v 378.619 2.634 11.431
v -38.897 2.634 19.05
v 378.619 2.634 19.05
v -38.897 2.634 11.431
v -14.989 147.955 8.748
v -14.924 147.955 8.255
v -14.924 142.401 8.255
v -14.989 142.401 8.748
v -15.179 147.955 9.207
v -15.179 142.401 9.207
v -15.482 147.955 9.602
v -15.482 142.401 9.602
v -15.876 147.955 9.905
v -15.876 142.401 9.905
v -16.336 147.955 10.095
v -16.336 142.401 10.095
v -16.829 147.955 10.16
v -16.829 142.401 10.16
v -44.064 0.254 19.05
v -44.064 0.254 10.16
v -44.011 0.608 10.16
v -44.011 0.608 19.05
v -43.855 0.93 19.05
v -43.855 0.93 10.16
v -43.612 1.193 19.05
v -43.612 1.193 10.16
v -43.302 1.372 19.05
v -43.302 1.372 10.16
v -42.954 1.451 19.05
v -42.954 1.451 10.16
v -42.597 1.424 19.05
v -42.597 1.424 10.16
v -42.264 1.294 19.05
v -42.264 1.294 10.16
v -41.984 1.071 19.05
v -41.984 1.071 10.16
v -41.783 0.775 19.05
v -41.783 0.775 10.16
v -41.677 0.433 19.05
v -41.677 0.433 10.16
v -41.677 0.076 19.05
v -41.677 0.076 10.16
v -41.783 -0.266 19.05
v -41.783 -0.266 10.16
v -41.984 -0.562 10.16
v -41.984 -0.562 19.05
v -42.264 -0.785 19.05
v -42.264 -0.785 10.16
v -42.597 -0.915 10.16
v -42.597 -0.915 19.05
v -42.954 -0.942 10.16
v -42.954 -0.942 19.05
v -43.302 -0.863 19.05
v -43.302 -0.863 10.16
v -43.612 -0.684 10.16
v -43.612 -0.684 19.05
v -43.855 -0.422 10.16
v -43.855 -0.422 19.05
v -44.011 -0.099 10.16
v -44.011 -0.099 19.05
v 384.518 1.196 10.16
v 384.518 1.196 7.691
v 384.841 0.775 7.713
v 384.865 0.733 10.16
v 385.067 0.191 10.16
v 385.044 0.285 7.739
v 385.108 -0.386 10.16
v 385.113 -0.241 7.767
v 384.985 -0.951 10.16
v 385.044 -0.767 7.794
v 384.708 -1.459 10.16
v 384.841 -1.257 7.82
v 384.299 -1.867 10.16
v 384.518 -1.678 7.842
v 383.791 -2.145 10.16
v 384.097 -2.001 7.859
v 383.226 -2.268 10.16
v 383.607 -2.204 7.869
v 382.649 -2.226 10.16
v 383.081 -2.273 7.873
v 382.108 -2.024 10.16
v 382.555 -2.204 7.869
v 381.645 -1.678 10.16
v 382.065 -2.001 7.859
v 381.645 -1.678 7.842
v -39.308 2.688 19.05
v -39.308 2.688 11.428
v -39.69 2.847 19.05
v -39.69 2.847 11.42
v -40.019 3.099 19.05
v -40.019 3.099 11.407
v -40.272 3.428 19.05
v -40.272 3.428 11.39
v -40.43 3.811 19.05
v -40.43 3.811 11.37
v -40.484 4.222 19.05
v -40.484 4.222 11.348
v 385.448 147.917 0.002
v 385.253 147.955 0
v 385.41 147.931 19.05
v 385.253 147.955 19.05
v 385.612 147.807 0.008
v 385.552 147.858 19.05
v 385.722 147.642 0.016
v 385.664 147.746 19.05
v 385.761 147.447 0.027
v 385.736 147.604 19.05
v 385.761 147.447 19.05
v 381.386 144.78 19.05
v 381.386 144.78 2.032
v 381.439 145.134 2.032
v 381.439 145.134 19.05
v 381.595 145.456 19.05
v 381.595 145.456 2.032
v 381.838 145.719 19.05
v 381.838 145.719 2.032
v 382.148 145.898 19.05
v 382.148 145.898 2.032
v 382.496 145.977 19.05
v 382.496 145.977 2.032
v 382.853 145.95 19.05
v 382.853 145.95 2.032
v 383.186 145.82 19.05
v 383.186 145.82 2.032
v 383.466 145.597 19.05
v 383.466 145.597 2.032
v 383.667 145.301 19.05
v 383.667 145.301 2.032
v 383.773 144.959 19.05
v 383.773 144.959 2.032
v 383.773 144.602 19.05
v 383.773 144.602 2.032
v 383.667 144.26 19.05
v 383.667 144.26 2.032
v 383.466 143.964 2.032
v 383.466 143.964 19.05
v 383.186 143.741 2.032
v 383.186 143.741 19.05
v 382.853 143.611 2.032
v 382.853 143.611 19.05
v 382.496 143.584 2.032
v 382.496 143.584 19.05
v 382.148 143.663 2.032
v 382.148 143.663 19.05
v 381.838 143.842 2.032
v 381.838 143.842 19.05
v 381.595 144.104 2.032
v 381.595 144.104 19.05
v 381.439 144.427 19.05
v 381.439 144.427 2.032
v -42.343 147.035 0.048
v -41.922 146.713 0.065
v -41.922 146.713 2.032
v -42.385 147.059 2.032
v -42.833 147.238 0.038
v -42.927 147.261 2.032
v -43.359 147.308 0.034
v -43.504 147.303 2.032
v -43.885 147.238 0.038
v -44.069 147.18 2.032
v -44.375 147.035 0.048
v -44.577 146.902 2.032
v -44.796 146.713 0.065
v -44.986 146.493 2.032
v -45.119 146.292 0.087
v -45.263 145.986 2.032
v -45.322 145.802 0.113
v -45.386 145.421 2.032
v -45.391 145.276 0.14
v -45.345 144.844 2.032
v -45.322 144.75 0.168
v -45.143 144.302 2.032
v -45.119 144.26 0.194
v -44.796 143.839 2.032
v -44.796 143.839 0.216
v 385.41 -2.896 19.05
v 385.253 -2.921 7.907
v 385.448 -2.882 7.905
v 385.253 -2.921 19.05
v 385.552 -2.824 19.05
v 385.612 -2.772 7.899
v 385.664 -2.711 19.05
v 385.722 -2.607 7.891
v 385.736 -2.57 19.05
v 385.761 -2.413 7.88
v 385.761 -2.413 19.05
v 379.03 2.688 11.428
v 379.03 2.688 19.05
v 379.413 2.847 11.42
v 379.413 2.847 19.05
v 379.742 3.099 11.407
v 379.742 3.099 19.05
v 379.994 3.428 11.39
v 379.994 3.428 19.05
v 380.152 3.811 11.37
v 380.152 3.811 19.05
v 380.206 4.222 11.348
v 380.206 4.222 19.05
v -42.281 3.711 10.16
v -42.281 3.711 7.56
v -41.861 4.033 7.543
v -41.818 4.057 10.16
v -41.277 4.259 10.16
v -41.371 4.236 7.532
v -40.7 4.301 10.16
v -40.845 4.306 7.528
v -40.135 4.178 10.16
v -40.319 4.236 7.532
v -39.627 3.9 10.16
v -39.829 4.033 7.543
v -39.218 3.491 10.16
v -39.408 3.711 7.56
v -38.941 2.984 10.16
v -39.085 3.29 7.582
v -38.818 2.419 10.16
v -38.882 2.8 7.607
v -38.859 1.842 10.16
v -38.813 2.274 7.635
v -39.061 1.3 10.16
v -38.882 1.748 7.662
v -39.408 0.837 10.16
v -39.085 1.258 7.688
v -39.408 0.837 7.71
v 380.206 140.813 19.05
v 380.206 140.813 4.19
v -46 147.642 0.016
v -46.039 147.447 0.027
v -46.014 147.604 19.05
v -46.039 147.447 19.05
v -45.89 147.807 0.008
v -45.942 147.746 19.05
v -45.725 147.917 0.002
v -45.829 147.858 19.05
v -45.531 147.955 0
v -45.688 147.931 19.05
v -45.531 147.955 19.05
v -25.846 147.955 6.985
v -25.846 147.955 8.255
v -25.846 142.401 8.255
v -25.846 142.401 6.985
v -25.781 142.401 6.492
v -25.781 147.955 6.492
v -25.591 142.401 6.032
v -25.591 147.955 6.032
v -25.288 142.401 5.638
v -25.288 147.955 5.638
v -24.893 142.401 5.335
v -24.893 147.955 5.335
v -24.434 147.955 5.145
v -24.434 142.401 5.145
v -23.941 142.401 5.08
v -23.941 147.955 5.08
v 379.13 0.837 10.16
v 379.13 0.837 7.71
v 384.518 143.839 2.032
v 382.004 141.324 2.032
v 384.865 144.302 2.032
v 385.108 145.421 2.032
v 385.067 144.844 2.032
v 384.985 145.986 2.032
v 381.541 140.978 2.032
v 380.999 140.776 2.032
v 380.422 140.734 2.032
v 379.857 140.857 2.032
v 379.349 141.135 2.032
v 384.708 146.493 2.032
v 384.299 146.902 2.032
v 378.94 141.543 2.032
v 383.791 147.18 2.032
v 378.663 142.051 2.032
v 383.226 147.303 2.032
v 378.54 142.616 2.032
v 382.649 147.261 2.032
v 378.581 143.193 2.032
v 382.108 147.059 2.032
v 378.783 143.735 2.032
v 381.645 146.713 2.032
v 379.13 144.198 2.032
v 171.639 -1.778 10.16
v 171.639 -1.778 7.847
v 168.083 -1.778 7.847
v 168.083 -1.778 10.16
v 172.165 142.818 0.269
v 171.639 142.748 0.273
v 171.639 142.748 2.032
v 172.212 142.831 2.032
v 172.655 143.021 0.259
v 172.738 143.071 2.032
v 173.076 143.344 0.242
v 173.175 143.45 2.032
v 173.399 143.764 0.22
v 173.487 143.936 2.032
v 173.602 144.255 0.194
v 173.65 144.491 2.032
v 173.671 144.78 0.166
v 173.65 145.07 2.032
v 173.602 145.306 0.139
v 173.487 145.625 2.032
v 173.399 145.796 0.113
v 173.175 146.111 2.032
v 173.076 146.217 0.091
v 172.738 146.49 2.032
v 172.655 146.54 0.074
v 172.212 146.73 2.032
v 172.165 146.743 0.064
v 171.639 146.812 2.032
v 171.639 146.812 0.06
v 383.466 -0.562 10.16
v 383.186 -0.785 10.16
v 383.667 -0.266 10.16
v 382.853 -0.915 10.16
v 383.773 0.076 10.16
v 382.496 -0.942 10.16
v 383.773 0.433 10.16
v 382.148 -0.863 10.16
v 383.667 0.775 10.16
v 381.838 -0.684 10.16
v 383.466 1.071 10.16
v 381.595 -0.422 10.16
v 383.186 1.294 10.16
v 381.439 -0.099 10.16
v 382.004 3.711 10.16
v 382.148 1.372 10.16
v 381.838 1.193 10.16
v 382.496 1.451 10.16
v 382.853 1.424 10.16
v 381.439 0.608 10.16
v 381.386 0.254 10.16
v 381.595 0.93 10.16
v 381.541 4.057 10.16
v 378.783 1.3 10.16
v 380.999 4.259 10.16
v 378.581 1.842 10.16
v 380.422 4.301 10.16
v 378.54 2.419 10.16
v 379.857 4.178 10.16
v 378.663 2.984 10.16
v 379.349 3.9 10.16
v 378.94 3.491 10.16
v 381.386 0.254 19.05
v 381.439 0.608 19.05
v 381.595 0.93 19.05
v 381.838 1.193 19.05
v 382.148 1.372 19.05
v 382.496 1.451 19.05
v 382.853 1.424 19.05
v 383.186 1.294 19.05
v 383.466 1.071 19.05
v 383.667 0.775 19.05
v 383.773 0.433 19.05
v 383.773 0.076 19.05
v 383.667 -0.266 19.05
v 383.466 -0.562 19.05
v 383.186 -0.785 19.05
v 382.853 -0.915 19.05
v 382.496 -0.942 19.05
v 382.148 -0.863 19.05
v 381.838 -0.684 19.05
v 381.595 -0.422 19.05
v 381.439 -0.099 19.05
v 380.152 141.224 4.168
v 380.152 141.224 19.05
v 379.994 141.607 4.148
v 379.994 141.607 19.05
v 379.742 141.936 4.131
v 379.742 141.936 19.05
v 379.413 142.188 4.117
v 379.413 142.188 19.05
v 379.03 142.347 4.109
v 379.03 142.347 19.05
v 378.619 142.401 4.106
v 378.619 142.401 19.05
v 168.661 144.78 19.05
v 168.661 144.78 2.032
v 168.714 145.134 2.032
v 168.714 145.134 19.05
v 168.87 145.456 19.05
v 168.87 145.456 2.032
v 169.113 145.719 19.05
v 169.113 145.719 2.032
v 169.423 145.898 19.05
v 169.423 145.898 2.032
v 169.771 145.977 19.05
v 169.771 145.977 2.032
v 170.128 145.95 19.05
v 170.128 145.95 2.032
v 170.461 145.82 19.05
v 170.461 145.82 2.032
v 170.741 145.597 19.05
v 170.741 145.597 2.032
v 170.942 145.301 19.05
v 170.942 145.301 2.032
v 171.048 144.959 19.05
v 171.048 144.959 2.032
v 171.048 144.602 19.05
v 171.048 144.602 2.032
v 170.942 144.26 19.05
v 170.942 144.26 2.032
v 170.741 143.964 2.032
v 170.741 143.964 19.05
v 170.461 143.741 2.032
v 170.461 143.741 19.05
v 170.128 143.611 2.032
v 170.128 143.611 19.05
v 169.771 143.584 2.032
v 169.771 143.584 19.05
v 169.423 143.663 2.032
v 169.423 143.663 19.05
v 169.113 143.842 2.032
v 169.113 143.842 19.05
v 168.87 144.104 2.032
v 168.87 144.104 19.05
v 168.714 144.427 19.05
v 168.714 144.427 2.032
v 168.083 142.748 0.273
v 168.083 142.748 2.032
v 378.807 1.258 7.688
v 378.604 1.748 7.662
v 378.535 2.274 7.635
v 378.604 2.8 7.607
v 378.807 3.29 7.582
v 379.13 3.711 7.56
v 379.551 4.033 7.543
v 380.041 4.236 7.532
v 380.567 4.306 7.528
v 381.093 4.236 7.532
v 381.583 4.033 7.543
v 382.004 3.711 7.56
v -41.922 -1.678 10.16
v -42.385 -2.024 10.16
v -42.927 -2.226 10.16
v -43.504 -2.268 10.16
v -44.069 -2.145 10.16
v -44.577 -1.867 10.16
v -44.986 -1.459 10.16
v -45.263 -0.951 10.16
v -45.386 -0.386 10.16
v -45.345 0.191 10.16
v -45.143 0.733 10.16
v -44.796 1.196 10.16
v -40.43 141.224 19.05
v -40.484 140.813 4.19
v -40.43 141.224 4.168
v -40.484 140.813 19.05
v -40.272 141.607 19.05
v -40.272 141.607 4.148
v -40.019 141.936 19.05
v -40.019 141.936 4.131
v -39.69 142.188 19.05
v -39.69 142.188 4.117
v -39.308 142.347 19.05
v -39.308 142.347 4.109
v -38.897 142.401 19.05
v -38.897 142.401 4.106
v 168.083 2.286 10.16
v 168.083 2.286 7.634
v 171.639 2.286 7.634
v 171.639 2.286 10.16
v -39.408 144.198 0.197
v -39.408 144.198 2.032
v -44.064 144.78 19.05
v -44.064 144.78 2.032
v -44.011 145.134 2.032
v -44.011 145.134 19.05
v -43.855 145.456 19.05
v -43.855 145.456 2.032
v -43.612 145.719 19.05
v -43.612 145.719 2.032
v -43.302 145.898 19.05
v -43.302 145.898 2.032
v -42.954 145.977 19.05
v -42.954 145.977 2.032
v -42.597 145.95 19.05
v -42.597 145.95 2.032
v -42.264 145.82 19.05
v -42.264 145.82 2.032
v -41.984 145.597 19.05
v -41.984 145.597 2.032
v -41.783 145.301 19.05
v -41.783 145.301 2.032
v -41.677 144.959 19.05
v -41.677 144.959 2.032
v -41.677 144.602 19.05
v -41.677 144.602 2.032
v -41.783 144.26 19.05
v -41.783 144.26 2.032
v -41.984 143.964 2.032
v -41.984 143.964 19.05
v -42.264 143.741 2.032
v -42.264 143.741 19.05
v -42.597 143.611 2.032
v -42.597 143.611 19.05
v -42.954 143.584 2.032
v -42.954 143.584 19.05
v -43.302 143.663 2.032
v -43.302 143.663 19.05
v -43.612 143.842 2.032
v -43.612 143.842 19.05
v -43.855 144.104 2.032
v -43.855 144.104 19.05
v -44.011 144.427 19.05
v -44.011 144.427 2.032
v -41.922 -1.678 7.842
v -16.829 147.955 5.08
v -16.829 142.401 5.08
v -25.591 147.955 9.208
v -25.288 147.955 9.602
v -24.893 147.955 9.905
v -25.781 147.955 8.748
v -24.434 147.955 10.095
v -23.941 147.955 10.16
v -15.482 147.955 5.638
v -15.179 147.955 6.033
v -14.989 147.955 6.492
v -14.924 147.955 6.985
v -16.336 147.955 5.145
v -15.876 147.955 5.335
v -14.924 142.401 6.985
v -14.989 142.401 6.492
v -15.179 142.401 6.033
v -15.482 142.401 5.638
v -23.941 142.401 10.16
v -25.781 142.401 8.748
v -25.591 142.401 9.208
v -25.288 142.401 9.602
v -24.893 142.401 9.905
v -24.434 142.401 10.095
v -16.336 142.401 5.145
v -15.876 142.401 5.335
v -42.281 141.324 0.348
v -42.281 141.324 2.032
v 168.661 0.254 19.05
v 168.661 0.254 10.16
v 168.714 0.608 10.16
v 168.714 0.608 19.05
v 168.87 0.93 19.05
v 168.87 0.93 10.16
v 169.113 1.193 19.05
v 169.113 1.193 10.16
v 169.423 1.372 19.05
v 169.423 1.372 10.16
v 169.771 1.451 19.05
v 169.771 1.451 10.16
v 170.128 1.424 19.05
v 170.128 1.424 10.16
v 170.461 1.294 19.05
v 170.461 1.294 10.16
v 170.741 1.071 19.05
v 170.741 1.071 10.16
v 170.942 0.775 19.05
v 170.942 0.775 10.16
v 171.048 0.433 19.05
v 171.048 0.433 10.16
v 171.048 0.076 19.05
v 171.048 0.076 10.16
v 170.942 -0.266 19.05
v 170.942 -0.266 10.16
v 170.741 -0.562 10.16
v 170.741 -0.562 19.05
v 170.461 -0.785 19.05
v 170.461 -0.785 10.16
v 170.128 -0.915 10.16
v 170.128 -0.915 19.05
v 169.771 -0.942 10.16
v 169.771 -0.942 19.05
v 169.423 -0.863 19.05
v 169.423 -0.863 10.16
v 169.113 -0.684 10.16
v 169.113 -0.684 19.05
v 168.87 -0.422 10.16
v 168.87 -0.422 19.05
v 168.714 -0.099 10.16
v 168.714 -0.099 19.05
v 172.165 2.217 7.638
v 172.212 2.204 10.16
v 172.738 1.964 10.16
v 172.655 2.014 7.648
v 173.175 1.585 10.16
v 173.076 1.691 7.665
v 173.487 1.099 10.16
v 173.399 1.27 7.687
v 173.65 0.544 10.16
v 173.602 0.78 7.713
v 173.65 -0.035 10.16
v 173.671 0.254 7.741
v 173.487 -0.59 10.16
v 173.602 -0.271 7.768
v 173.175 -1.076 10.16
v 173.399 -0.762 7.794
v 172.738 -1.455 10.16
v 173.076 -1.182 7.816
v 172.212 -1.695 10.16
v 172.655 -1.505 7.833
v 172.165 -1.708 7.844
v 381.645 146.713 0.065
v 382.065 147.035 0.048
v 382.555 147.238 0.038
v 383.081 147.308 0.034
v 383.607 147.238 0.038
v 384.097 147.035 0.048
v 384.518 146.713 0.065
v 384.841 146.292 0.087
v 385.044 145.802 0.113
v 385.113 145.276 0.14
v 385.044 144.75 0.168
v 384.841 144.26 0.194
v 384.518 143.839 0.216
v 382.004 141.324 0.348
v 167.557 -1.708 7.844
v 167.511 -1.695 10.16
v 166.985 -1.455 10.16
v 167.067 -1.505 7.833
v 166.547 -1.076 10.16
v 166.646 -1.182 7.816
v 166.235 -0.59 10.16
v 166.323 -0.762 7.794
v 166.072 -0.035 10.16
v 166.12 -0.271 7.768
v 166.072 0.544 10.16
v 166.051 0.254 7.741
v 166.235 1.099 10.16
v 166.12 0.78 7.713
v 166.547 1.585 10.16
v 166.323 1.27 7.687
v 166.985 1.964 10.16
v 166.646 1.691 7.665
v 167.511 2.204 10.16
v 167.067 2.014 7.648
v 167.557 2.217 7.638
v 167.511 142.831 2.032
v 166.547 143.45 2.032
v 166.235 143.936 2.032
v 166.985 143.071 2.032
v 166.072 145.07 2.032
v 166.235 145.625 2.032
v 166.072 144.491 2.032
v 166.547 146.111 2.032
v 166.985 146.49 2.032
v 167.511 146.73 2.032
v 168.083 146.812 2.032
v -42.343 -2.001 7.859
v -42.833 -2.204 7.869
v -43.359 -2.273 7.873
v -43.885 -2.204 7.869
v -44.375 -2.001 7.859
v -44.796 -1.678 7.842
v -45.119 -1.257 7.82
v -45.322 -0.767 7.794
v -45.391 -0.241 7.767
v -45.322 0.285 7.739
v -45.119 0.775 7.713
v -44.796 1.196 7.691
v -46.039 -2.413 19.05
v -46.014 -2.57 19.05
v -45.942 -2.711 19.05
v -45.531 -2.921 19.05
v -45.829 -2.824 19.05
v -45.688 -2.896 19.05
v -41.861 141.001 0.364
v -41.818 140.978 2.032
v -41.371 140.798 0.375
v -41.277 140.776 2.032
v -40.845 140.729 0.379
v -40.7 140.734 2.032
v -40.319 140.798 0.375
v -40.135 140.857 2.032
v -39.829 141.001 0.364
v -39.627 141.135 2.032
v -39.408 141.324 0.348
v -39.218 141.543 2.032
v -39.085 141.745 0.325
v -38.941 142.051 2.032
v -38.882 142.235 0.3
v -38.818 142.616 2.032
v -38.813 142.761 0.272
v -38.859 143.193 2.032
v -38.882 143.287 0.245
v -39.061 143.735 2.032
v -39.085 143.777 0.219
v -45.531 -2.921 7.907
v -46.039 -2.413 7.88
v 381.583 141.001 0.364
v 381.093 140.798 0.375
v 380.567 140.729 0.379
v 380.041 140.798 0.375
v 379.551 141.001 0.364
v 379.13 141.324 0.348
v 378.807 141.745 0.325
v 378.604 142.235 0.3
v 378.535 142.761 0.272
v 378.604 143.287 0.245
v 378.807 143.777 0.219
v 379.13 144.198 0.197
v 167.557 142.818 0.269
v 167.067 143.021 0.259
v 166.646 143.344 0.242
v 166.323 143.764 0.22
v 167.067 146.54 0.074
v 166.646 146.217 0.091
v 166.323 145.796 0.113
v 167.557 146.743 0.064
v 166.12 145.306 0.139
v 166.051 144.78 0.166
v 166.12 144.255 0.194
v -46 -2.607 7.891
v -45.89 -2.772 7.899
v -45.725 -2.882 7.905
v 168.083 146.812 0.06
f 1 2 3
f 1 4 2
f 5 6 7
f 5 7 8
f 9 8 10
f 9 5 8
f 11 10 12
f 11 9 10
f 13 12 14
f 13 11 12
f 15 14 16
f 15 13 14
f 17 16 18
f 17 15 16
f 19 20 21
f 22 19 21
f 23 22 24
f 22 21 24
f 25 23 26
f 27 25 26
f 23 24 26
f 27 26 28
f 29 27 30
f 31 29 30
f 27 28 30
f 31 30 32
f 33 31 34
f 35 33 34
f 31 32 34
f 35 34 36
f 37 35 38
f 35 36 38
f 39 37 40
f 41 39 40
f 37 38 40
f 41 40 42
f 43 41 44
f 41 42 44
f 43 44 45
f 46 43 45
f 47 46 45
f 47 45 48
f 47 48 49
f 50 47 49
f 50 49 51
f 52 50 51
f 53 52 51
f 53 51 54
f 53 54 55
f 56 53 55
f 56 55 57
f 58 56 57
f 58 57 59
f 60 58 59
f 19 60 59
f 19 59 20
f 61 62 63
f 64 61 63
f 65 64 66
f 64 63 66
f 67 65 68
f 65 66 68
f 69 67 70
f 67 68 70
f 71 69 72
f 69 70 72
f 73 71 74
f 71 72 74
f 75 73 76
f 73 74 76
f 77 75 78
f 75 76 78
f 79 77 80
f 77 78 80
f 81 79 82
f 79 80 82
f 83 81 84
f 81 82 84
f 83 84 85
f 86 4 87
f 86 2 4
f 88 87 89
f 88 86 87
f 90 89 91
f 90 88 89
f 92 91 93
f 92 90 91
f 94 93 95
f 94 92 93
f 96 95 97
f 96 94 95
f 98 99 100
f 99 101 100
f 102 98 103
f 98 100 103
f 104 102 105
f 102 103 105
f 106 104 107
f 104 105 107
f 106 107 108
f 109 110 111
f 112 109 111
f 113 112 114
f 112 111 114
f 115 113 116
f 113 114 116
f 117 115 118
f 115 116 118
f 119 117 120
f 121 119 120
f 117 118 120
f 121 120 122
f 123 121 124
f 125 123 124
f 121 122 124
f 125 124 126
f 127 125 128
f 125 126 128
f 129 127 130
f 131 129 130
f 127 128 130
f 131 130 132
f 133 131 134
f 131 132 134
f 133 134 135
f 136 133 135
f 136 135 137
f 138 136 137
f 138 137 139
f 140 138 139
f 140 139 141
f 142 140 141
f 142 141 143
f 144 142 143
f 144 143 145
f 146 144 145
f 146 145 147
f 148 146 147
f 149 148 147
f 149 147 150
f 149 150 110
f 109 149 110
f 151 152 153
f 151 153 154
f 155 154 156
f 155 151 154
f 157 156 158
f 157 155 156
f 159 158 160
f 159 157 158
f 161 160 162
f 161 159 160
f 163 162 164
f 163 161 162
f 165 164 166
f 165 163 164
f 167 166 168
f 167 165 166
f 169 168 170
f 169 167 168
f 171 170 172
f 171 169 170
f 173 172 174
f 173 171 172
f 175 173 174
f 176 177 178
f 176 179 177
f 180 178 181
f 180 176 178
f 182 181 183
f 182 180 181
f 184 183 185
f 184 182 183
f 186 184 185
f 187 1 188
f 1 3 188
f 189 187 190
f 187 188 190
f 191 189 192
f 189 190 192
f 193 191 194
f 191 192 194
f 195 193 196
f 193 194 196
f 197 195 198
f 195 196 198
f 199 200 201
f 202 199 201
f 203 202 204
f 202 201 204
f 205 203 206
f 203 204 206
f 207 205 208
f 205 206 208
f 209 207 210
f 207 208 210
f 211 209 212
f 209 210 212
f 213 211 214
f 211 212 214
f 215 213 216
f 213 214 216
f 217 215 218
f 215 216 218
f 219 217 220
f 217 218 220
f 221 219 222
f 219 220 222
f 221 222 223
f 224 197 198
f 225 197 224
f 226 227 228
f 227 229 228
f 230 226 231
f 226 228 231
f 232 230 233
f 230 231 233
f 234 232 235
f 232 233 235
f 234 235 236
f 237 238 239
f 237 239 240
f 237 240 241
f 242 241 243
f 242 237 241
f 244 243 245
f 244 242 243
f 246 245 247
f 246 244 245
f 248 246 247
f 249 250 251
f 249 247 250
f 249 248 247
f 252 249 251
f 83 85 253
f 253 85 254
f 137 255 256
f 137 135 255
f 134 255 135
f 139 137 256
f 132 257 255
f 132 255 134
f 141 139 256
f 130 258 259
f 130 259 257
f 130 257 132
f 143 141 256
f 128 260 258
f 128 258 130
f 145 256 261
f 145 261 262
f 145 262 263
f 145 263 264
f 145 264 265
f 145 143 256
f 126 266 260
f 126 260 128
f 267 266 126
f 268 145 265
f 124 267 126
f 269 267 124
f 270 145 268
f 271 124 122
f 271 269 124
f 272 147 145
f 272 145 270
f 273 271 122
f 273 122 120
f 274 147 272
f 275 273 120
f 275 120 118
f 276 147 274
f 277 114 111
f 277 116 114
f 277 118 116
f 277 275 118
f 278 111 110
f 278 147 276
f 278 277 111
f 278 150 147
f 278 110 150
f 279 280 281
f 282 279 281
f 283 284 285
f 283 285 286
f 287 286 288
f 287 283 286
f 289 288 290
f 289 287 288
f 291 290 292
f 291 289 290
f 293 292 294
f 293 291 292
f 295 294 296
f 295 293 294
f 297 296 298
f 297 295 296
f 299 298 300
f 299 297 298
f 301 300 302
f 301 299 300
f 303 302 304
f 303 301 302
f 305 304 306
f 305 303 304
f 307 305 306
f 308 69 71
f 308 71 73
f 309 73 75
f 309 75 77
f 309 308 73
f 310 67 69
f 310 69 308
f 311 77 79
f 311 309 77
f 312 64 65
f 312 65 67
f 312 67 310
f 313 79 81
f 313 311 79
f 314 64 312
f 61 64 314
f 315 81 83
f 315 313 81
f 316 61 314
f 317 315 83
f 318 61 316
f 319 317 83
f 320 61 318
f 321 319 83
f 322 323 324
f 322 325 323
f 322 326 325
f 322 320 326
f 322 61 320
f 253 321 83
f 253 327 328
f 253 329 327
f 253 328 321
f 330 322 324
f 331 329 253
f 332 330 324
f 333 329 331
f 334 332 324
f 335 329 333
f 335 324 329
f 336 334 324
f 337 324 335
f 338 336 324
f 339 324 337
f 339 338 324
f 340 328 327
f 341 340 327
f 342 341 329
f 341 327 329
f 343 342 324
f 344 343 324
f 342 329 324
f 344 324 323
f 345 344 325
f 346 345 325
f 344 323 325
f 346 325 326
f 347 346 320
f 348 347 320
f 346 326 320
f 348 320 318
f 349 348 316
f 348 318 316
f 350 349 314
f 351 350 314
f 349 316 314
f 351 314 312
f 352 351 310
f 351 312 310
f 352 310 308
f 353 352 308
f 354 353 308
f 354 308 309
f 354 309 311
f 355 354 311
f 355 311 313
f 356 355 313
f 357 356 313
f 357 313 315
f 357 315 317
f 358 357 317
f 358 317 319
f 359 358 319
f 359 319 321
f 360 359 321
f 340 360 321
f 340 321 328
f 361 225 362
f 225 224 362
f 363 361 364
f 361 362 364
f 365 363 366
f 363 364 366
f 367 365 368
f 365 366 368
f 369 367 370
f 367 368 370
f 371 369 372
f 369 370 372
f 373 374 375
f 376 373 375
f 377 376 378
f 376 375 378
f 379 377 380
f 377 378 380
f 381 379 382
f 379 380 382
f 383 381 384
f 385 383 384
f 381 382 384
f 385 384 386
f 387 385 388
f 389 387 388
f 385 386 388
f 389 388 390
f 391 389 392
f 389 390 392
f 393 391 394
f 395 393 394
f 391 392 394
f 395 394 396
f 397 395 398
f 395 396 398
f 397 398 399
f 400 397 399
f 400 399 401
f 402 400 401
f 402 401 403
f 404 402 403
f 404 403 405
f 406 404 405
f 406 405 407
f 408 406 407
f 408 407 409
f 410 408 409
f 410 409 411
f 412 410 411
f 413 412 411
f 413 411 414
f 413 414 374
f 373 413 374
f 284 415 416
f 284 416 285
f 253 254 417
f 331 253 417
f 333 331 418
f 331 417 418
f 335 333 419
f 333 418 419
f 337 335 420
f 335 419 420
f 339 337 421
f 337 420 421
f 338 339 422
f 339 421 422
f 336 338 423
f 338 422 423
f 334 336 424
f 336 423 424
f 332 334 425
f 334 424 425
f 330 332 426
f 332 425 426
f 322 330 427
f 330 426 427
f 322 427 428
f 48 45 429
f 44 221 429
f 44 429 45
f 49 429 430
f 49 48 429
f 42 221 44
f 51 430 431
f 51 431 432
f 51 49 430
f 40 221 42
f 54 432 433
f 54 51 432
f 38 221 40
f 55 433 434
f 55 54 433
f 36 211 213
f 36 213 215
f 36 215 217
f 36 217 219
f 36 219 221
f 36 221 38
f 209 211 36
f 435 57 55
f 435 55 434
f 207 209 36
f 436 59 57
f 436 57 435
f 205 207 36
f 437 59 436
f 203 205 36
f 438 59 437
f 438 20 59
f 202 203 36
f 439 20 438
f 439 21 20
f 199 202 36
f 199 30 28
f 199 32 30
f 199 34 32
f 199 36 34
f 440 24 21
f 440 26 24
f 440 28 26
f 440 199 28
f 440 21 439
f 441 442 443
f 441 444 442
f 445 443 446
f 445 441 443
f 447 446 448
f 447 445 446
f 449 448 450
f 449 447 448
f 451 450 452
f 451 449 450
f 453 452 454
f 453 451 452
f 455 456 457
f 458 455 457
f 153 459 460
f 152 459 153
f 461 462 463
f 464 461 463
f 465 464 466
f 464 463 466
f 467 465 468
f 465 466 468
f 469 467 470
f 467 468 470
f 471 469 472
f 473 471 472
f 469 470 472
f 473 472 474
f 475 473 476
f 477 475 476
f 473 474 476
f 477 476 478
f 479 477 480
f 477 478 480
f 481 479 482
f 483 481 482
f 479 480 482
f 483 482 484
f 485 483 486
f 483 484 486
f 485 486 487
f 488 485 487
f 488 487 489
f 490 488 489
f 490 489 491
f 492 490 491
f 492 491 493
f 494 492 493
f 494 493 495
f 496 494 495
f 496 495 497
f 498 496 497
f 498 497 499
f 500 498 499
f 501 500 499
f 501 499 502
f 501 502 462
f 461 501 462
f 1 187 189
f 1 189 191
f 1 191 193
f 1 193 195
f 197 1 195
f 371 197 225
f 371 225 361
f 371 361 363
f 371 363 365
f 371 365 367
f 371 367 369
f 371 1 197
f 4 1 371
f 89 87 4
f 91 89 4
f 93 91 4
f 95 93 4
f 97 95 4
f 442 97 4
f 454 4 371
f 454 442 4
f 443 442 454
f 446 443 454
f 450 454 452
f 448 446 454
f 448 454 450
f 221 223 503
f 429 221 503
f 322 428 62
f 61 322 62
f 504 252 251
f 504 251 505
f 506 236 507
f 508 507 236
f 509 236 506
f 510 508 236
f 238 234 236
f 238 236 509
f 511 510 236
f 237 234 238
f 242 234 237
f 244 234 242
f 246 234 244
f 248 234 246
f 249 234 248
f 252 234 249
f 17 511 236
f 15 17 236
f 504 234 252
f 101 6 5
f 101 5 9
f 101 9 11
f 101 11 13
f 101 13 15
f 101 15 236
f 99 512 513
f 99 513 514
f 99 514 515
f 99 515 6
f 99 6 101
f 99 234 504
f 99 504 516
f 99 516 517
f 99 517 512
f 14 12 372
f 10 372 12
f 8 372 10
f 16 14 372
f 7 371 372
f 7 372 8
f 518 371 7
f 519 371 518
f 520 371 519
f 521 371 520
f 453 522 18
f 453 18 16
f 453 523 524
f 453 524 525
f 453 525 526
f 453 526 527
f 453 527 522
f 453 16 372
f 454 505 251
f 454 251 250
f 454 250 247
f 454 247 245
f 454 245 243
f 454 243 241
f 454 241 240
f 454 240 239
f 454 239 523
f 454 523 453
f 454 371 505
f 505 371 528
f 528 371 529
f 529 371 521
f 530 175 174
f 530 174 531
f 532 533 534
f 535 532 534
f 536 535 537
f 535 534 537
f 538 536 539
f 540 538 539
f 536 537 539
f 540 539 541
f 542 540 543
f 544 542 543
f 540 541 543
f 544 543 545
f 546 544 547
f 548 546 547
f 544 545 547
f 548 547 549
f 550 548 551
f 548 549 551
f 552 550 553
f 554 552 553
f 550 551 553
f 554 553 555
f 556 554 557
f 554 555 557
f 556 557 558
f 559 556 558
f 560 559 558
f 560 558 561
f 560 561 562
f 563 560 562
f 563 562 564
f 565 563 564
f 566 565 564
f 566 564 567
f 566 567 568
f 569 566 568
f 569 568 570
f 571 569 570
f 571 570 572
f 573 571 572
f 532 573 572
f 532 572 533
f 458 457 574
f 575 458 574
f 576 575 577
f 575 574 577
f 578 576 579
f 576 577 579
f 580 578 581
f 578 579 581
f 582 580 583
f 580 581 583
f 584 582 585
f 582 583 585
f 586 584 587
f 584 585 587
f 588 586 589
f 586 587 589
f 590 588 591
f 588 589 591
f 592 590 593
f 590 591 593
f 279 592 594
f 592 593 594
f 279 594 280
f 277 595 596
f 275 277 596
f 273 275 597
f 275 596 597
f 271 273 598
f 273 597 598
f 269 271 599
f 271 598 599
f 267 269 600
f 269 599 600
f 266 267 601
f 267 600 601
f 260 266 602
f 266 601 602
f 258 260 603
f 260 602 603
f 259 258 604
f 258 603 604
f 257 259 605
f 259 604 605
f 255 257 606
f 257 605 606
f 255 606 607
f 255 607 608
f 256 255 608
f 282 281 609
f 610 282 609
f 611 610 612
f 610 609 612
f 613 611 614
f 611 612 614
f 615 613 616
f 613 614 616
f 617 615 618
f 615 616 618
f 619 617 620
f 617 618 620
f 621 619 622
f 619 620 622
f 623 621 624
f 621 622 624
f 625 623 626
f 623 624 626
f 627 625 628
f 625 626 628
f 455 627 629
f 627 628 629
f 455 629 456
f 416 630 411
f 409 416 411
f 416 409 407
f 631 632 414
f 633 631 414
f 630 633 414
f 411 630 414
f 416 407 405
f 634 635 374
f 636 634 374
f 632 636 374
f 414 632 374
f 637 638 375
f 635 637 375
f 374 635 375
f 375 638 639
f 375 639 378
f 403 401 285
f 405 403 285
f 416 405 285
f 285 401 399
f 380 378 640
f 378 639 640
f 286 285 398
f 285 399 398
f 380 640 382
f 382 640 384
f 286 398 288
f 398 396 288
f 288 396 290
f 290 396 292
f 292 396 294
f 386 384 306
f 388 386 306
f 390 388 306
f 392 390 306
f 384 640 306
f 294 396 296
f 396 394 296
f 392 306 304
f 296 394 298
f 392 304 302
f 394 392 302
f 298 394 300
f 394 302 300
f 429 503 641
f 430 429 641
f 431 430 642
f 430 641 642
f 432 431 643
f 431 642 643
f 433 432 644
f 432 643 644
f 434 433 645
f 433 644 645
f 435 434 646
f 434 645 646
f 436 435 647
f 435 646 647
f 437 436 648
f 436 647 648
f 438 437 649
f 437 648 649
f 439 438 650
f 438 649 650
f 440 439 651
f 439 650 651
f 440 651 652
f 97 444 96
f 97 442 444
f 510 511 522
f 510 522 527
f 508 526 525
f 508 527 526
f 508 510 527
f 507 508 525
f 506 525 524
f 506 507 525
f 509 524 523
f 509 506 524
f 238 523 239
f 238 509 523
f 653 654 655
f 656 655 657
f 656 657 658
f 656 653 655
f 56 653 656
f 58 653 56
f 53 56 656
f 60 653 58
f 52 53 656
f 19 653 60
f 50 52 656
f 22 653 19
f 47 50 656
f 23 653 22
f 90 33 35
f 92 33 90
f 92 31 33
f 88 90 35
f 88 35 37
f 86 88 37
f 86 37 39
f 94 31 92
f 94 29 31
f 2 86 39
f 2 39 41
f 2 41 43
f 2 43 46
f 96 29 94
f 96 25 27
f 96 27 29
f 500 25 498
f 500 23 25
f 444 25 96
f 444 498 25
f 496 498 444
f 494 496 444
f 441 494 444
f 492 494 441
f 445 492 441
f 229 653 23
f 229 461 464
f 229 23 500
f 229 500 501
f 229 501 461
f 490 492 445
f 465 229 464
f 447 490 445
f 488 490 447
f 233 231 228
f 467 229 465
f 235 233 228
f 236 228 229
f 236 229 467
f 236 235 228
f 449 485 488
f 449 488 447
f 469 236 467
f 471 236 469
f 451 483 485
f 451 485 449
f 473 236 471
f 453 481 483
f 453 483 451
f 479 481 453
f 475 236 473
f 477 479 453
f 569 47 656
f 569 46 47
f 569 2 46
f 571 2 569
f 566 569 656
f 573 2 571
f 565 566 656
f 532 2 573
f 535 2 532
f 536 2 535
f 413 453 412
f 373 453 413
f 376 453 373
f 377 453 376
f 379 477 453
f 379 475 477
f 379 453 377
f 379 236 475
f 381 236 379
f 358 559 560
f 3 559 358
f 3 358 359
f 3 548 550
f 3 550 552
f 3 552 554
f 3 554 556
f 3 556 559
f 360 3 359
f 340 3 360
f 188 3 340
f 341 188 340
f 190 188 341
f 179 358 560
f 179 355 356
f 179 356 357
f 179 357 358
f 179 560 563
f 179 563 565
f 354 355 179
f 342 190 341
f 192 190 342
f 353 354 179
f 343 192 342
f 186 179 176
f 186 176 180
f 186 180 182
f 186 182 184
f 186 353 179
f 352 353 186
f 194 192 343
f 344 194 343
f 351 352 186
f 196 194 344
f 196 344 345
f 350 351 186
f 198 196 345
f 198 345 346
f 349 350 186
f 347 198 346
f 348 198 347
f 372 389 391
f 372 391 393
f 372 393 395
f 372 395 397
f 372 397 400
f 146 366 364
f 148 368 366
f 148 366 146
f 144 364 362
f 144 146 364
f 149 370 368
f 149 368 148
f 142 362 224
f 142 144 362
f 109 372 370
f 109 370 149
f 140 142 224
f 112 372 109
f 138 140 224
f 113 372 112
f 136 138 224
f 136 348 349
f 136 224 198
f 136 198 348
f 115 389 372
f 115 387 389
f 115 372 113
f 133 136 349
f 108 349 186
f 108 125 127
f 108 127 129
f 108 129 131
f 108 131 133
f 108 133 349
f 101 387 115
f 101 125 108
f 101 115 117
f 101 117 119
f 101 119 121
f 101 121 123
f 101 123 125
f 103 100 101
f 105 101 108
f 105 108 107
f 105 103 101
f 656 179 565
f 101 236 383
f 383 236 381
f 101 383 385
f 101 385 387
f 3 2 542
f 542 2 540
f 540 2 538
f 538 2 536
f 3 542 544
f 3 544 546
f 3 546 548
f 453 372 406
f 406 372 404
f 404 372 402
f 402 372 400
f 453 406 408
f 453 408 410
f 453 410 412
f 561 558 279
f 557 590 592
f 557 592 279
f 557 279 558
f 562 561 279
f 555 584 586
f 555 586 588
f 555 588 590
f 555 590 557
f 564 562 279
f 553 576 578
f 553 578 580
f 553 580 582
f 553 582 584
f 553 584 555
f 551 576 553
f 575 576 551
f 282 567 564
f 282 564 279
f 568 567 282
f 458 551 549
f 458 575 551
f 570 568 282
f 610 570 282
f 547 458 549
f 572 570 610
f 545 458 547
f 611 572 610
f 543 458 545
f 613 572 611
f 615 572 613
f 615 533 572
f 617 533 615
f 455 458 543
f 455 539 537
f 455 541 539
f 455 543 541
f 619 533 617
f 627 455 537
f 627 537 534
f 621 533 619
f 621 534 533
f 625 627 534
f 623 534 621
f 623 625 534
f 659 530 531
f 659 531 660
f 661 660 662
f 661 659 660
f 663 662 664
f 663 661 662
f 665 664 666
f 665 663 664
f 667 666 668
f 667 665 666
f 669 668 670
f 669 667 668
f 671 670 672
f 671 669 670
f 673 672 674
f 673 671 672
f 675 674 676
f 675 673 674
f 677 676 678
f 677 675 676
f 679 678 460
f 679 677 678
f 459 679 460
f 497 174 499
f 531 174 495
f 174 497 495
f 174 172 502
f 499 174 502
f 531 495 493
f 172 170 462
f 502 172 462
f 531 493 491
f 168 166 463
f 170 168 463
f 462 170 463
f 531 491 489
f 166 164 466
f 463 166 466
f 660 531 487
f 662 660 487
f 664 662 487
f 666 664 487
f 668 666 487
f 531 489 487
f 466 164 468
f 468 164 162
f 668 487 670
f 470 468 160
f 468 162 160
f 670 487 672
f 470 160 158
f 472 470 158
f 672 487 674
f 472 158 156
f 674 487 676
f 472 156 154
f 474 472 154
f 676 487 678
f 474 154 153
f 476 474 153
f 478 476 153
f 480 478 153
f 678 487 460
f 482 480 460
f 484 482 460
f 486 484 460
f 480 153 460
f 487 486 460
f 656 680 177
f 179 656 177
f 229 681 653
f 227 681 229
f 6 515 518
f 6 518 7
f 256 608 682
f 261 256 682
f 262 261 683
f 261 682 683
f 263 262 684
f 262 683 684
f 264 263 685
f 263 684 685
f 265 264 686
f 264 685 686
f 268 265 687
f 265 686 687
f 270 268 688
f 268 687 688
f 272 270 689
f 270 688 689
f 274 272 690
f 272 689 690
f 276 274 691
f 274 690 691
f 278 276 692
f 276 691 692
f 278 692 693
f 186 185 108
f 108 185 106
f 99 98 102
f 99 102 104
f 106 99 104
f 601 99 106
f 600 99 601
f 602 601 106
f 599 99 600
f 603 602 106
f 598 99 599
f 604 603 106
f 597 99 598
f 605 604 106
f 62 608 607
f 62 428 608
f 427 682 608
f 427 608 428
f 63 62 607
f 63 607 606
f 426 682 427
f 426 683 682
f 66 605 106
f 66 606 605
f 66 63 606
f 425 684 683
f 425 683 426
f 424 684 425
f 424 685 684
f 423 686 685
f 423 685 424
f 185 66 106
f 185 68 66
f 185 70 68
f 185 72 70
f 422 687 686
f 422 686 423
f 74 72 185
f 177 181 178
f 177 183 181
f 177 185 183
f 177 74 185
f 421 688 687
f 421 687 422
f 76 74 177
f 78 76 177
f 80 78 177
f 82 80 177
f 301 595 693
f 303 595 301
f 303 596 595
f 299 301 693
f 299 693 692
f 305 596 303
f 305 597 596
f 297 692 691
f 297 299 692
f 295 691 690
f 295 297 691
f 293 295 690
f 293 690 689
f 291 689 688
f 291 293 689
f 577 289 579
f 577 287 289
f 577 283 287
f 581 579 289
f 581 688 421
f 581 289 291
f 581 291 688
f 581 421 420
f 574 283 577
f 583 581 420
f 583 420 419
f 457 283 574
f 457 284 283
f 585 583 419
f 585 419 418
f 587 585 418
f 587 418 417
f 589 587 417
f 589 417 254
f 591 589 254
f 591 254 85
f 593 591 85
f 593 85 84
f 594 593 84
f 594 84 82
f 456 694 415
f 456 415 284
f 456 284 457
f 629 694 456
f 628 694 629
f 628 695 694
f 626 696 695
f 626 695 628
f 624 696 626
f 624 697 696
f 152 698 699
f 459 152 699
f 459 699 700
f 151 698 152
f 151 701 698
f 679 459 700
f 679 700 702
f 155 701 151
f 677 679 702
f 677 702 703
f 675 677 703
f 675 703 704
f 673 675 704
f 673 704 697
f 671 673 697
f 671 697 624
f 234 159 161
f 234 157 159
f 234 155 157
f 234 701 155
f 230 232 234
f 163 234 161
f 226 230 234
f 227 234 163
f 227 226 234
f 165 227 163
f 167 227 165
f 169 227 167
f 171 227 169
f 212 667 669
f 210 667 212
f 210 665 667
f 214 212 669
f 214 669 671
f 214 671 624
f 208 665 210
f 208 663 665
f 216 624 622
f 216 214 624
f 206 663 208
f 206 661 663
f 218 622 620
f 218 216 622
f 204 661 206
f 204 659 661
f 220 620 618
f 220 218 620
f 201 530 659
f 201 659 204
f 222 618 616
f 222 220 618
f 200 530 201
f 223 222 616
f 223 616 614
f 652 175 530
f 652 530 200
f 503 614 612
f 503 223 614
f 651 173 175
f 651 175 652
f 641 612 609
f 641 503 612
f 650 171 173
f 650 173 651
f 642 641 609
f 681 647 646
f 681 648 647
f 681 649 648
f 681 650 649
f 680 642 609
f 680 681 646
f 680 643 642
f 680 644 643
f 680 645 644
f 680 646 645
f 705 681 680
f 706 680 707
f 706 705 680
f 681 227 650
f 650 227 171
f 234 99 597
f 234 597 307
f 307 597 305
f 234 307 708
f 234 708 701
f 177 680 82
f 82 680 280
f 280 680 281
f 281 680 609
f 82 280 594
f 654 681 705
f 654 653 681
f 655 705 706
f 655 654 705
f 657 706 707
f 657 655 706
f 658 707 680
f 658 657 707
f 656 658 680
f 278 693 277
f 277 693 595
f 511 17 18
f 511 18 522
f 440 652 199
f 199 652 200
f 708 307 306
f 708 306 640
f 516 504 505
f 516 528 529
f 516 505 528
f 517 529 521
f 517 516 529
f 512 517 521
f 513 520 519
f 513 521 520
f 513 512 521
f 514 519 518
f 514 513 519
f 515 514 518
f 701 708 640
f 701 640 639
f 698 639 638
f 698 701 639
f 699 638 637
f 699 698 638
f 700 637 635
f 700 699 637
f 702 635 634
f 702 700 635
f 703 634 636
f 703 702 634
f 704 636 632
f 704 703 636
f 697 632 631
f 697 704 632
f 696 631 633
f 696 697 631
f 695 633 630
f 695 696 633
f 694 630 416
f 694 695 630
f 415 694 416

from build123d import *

# Parameters (mm, degrees)
SKETCH3_W               = 431.8
SKETCH3_H               = 150.876
BOSS_EXTRUDE2_DEPTH     = 19.05
CUT_EXTRUDE4_DEPTH      = 432.8
SKETCH3_25_W            = 197.6453584
SKETCH3_25_H            = 139.766716802
SKETCH3_25_W_2          = 25.4
SKETCH3_25_W_3          = 197.645358401
CUT_EXTRUDE5_DEPTH      = 20.05
CUT_EXTRUDE5_DEPTH_BACK = 1
BOSS_EXTRUDE3_REACH     = 433.8
M2_CLEARANCE_HOLE1_D    = 2.4
CUT_EXTRUDE8_DEPTH      = 10.16
CUT_EXTRUDE9_DEPTH      = 2.032
FILLET7_R               = 1.5875
FILLET8_R               = 0.508
CUT_EXTRUDE10_REACH     = 152.876


with BuildPart() as part:
    # Sketch3 → Boss-Extrude2 (new body)
    with BuildSketch(Plane.XY):
        with Locations((169.861119801, 72.517452108)):
            Rectangle(SKETCH3_W, SKETCH3_H)
    extrude(amount=BOSS_EXTRUDE2_DEPTH)

    # Sketch11 → Cut-Extrude4 (cut, through all)
    with BuildSketch(Plane.ZY.offset(46.038880199)):
        Polygon((7.907076107, -2.920547892), (0, 147.955452108), (0, -2.920547892), align=None)
    extrude(amount=-CUT_EXTRUDE4_DEPTH, mode=Mode.SUBTRACT)

    # Sketch3<25> → Cut-Extrude5 (cut, two sides)
    with BuildSketch(Plane.XY) as cut_extrude5_sk:
        with Locations((281.383799001, 72.517452108)):
            Rectangle(SKETCH3_25_W, SKETCH3_25_H)
        with Locations((169.861119801, 72.517452108)):
            Rectangle(SKETCH3_25_W_2, SKETCH3_25_H)
        with Locations((58.338440601, 72.517452108)):
            Rectangle(SKETCH3_25_W_3, SKETCH3_25_H)
        with BuildLine():
            Line((-38.844861429, 142.400810509), (-40.4842386, 142.400810509))
            Line((-40.4842386, 142.400810509), (-40.4842386, 140.761433338))
            ThreePointArc((-40.4842386, 140.761433338), (-39.407803363, 141.324375272), (-38.844861429, 142.400810509))
        make_face()
        with BuildLine():
            ThreePointArc((-38.844861429, 2.634093707), (-39.407803363, 3.710528944), (-40.4842386, 4.273470879))
            Line((-40.4842386, 4.273470879), (-40.4842386, 2.634093707))
            Line((-40.4842386, 2.634093707), (-38.844861429, 2.634093707))
        make_face()
        with BuildLine():
            ThreePointArc((380.206478201, 4.273470879), (379.130042964, 3.710528944), (378.56710103, 2.634093707))
            Line((378.56710103, 2.634093707), (380.206478201, 2.634093707))
            Line((380.206478201, 2.634093707), (380.206478201, 4.273470879))
        make_face()
        with BuildLine():
            Line((380.206478201, 142.400810509), (378.56710103, 142.400810509))
            ThreePointArc((378.56710103, 142.400810509), (379.130042964, 141.324375272), (380.206478201, 140.761433338))
            Line((380.206478201, 140.761433338), (380.206478201, 142.400810509))
        make_face()
    extrude(amount=CUT_EXTRUDE5_DEPTH, mode=Mode.SUBTRACT)
    extrude(cut_extrude5_sk.sketch, amount=-CUT_EXTRUDE5_DEPTH_BACK, mode=Mode.SUBTRACT)

    # Sketch11<3> → Boss-Extrude3 (add, up to next)
    with BuildSketch(Plane.ZY.offset(46.038880199), mode=Mode.PRIVATE) as boss_extrude3_sk1:
        Polygon((3.815228638, 147.955452108), (0, 147.955452108), (7.907076107, -2.920547892), (11.722304745, -2.920547892), align=None)
    boss_extrude3_tool1 = extrude(boss_extrude3_sk1.sketch, amount=-BOSS_EXTRUDE3_REACH, mode=Mode.PRIVATE) - part.part
    add(boss_extrude3_tool1.solids().sort_by_distance((-46.03888, 72.517452, 5.861152))[0])

    # M2 Clearance Hole1 (through all)
    with Locations(Plane.XY.offset(19.05)):
        with Locations((-42.863880199, 144.780452108), (169.861119801, 144.780452108), (382.586119801, 144.780452108), (382.586119801, 0.254452108), (169.861119801, 0.254452108), (-42.863880199, 0.254452108)):
            Hole(M2_CLEARANCE_HOLE1_D / 2)

    # Sketch3<27> → Cut-Extrude8 (cut)
    with BuildSketch(Plane.XY):
        with BuildLine():
            Line((-44.795957036, 1.196057231), (-42.281485322, 3.710528944))
            ThreePointArc((-42.281485322, 3.710528944), (-39.407803363, 3.710528944), (-39.407803363, 0.836846986))
            Line((-39.407803363, 0.836846986), (-41.922275077, -1.677624728))
            ThreePointArc((-41.922275077, -1.677624728), (-44.795957036, -1.677624728), (-44.795957036, 1.196057231))
        make_face()
        with BuildLine():
            Line((168.083119801, 2.286452108), (171.639119801, 2.286452108))
            ThreePointArc((171.639119801, 2.286452108), (173.671119801, 0.254452108), (171.639119801, -1.777547892))
            Line((171.639119801, -1.777547892), (168.083119801, -1.777547892))
            ThreePointArc((168.083119801, -1.777547892), (166.051119801, 0.254452108), (168.083119801, 2.286452108))
        make_face()
        with BuildLine():
            Line((382.003724923, 3.710528944), (384.518196637, 1.196057231))
            ThreePointArc((384.518196637, 1.196057231), (384.518196637, -1.677624728), (381.644514678, -1.677624728))
            Line((381.644514678, -1.677624728), (379.130042964, 0.836846986))
            ThreePointArc((379.130042964, 0.836846986), (379.130042964, 3.710528944), (382.003724923, 3.710528944))
        make_face()
    extrude(amount=CUT_EXTRUDE8_DEPTH, mode=Mode.SUBTRACT)

    # Sketch3<28> → Cut-Extrude9 (cut)
    with BuildSketch(Plane.XY):
        with BuildLine():
            Line((168.083119801, 142.748452108), (171.639119801, 142.748452108))
            ThreePointArc((171.639119801, 142.748452108), (173.671119801, 144.780452108), (171.639119801, 146.812452108))
            Line((171.639119801, 146.812452108), (168.083119801, 146.812452108))
            ThreePointArc((168.083119801, 146.812452108), (166.051119801, 144.780452108), (168.083119801, 142.748452108))
        make_face()
        with BuildLine():
            Line((379.130042964, 144.198057231), (381.644514678, 146.712528944))
            ThreePointArc((381.644514678, 146.712528944), (384.518196637, 146.712528944), (384.518196637, 143.838846986))
            Line((384.518196637, 143.838846986), (382.003724923, 141.324375272))
            ThreePointArc((382.003724923, 141.324375272), (379.130042964, 141.324375272), (379.130042964, 144.198057231))
        make_face()
        with BuildLine():
            Line((-44.795957036, 143.838846986), (-42.281485322, 141.324375272))
            ThreePointArc((-42.281485322, 141.324375272), (-39.407803363, 141.324375272), (-39.407803363, 144.198057231))
            Line((-39.407803363, 144.198057231), (-41.922275077, 146.712528944))
            ThreePointArc((-41.922275077, 146.712528944), (-44.795957036, 146.712528944), (-44.795957036, 143.838846986))
        make_face()
    extrude(amount=CUT_EXTRUDE9_DEPTH, mode=Mode.SUBTRACT)

    # Fillet7
    fillet7_edges = [part.edges().sort_by_distance(p)[0] for p in [
        (380.206478201, 2.634093707, 15.240599157),
        (380.206478201, 142.400810509, 11.578167535),
        (-40.4842386, 142.400810509, 11.578167535),
        (-40.4842386, 2.634093707, 15.240599157),
    ]]
    fillet(fillet7_edges, radius=FILLET7_R)

    # Fillet8
    fillet8_edges = [part.edges().sort_by_distance(p)[0] for p in [
        (385.761119801, 147.955452108, 9.525),
        (-46.038880199, 147.955452108, 9.525),
        (-46.038880199, -2.920547892, 13.478538054),
        (385.761119801, -2.920547892, 13.478538054),
    ]]
    fillet(fillet8_edges, radius=FILLET8_R)

    # Sketch18 → Cut-Extrude10 (cut, up to next)
    with BuildSketch(Plane(origin=(0, 147.955452108, 0), x_dir=(1, 0, 0), z_dir=(0, 1, 0)), mode=Mode.PRIVATE) as cut_extrude10_sk1:
        with BuildLine():
            Line((-16.828880199, -10.16), (-23.940880199, -10.16))
            ThreePointArc((-23.940880199, -10.16), (-25.287918618, -9.602038418), (-25.845880199, -8.255))
            Line((-25.845880199, -8.255), (-25.845880199, -6.985))
            ThreePointArc((-25.845880199, -6.985), (-25.287918618, -5.637961582), (-23.940880199, -5.08))
            Line((-23.940880199, -5.08), (-16.828880199, -5.08))
            ThreePointArc((-16.828880199, -5.08), (-15.481841781, -5.637961582), (-14.923880199, -6.985))
            Line((-14.923880199, -6.985), (-14.923880199, -8.255))
            ThreePointArc((-14.923880199, -8.255), (-15.481841781, -9.602038418), (-16.828880199, -10.16))
        make_face()
    cut_extrude10_tool1 = extrude(cut_extrude10_sk1.sketch, amount=-CUT_EXTRUDE10_REACH, mode=Mode.PRIVATE) & part.part
    add(cut_extrude10_tool1.solids().sort_by_distance((-20.38488, 147.955452, 7.62))[0], mode=Mode.SUBTRACT)


solid = part.part
